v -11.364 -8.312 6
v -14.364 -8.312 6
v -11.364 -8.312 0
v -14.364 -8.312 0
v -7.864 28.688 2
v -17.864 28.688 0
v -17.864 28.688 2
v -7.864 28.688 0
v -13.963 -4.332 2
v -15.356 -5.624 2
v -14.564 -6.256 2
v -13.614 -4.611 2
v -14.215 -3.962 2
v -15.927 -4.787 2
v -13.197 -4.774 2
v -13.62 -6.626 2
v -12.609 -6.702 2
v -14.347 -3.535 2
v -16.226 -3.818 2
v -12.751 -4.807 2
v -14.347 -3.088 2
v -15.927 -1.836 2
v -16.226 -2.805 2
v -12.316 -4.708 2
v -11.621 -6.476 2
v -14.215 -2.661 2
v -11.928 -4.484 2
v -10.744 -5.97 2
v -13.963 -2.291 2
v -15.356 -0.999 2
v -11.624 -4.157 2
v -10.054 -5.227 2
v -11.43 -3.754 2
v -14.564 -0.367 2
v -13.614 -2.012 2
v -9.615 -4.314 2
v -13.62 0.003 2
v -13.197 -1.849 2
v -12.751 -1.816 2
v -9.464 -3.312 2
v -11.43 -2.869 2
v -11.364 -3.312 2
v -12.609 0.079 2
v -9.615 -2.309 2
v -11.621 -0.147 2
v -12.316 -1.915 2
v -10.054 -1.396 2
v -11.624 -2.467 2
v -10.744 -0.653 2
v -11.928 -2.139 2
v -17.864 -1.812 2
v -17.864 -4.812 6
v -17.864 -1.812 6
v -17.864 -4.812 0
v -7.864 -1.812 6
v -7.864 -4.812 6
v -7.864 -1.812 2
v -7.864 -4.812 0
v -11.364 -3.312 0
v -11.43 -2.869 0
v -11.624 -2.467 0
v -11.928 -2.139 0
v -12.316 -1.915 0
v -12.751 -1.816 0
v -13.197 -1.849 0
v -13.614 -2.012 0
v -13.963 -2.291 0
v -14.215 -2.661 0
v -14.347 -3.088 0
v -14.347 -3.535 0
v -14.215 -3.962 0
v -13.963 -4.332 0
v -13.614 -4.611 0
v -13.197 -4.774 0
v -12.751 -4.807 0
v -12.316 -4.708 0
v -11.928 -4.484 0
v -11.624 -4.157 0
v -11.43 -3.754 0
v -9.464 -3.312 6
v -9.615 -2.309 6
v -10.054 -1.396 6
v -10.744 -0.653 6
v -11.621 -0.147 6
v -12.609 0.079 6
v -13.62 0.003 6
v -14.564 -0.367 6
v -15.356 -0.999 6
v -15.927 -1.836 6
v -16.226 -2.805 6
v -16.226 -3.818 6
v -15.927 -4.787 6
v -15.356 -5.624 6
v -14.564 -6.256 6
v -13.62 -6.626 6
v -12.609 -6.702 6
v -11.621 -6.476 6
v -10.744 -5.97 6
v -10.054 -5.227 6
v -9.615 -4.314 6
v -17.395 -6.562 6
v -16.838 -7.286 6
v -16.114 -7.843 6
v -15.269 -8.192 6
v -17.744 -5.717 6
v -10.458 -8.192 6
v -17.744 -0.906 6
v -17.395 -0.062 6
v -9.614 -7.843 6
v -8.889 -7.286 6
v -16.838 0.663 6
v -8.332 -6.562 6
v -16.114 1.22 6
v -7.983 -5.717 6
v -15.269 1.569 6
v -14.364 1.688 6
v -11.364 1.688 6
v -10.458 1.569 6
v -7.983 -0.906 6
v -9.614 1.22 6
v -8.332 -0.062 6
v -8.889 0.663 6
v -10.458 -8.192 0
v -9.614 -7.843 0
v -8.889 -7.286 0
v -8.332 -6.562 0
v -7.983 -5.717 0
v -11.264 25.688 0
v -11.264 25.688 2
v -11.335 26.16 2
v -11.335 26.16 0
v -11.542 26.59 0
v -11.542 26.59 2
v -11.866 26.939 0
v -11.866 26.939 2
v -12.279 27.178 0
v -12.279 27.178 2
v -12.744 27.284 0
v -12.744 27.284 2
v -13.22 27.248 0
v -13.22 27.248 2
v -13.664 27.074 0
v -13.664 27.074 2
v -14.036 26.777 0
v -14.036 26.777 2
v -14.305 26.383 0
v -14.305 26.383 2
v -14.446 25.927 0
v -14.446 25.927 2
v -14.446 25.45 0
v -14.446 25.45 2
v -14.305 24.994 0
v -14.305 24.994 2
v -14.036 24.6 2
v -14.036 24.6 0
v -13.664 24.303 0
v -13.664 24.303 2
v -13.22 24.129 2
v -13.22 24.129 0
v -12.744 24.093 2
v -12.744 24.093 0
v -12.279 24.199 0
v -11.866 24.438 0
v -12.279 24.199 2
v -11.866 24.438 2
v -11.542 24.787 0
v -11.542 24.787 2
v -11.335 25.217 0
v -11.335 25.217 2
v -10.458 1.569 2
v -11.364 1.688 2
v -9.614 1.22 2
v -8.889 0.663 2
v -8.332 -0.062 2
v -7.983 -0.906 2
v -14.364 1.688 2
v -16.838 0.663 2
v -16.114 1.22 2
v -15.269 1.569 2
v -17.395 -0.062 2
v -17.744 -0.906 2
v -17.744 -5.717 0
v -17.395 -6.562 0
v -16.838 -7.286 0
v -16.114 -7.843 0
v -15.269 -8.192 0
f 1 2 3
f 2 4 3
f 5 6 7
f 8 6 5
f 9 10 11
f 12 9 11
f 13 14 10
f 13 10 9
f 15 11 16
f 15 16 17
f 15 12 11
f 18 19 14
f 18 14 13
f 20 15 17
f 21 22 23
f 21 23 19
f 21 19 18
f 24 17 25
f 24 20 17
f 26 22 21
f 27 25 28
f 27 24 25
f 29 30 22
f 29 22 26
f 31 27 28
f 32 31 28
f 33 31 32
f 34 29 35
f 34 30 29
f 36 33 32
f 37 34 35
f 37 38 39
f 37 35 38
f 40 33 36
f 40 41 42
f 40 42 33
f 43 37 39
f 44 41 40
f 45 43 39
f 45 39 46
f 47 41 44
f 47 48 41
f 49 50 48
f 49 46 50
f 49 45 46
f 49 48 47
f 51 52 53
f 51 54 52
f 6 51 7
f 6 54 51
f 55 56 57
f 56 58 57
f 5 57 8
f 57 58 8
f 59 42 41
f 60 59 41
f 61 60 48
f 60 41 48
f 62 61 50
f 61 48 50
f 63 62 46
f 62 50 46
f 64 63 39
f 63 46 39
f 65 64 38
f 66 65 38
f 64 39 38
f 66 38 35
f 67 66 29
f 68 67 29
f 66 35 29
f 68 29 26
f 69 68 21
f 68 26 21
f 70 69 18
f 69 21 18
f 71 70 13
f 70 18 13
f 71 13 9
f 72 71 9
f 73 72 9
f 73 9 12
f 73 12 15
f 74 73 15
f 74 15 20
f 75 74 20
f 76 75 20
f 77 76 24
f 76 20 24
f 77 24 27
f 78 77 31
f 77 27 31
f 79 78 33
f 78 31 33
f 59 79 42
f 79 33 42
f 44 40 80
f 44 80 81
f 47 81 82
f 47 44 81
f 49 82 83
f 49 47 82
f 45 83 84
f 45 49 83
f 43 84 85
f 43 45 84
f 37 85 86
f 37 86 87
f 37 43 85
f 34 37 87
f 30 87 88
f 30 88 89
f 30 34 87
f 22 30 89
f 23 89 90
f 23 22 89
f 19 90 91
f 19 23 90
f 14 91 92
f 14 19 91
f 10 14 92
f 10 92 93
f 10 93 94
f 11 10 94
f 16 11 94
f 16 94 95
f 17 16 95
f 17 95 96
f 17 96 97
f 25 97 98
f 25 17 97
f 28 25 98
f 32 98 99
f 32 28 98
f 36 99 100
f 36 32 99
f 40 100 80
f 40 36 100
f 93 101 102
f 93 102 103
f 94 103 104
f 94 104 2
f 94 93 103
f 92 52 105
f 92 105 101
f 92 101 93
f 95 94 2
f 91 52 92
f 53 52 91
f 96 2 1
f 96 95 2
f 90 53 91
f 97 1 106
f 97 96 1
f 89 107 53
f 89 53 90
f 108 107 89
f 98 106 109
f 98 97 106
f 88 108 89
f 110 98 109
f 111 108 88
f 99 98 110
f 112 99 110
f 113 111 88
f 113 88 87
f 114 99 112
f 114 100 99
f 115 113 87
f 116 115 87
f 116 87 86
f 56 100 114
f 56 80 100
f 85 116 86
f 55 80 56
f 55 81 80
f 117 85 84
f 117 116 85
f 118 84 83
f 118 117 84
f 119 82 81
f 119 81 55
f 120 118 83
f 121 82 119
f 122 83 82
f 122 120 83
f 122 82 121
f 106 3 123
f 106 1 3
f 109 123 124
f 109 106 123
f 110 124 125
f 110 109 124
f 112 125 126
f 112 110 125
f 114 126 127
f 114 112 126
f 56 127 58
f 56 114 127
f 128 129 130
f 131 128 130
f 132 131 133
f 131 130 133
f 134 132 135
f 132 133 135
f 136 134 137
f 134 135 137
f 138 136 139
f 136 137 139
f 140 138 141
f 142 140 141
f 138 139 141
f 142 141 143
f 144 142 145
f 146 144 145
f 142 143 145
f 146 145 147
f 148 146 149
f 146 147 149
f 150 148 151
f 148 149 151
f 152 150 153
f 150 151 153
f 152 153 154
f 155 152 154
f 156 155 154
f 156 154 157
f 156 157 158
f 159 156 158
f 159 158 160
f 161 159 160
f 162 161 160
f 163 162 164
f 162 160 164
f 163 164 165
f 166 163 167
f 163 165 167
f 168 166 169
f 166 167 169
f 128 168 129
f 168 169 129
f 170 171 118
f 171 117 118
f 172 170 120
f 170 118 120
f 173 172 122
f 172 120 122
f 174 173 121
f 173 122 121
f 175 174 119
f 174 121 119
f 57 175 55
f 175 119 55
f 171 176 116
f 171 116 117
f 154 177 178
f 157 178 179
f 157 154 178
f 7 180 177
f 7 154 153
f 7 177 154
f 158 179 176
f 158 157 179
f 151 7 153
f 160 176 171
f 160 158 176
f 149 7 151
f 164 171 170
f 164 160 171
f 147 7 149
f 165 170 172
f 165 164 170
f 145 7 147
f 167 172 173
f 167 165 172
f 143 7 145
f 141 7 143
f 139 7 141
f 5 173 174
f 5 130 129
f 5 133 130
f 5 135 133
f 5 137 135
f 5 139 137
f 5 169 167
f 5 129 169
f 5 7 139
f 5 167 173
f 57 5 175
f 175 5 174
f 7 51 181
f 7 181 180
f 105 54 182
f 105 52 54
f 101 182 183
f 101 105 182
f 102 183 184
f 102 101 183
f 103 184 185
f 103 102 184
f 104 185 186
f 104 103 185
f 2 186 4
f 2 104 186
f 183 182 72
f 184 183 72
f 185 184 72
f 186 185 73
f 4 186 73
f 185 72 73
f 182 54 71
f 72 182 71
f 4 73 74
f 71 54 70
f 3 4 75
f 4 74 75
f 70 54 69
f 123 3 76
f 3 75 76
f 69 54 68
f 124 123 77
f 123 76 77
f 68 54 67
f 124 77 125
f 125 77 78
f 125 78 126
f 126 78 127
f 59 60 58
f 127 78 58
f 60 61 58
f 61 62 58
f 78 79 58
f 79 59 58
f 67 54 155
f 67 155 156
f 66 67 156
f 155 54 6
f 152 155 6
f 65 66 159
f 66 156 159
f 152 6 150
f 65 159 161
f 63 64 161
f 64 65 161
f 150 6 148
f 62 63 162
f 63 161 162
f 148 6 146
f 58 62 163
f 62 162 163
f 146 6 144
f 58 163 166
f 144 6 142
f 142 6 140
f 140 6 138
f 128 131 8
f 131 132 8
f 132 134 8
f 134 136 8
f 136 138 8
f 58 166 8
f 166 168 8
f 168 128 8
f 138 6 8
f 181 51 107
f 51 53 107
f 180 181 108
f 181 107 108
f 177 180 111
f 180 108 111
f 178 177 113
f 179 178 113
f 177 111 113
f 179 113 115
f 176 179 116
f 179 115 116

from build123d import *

# Parameters (mm, degrees)
SKETCH1_W           = 10
SKETCH1_H           = 37
BOSS_EXTRUDE1_DEPTH = 2
SKETCH2_W           = 10
SKETCH2_H           = 10
SKETCH2_R           = 3.4
BOSS_EXTRUDE2_DEPTH = 4
SKETCH3_R           = 1.6
CUT_EXTRUDE1_DEPTH  = 2
FILLET1_R           = 3.5
SKETCH4_R           = 1.5
CUT_EXTRUDE2_DEPTH  = 2


with BuildPart() as part:
    # Sketch1 → Boss-Extrude1 (new body)
    with BuildSketch(Plane.XY):
        with Locations((-12.863567867, 10.18847884)):
            Rectangle(SKETCH1_W, SKETCH1_H)
    extrude(amount=BOSS_EXTRUDE1_DEPTH)

    # Sketch2 → Boss-Extrude2 (add)
    with BuildSketch(Plane.XY.offset(2)):
        with Locations((-12.863567867, -3.31152116)):
            Rectangle(SKETCH2_W, SKETCH2_H)
        with Locations((-12.863567867, -3.31152116)):
            Circle(SKETCH2_R, mode=Mode.SUBTRACT)
    extrude(amount=BOSS_EXTRUDE2_DEPTH)

    # Sketch3 → Cut-Extrude1 (cut)
    with BuildSketch(Plane.XY.offset(2)):
        with Locations((-12.863567867, 25.68847884)):
            Circle(SKETCH3_R)
    extrude(amount=-CUT_EXTRUDE1_DEPTH, mode=Mode.SUBTRACT)

    # Fillet1
    fillet1_edges = [part.edges().sort_by_distance(p)[0] for p in [
        (-7.863567867, -8.31152116, 3),
        (-17.863567867, -8.31152116, 3),
        (-17.863567867, 1.68847884, 4),
        (-7.863567867, 1.68847884, 4),
    ]]
    fillet(fillet1_edges, radius=FILLET1_R)

    # Sketch4 → Cut-Extrude2 (cut)
    with BuildSketch(Plane.XY.offset(2)):
        with Locations((-12.863567867, -3.31152116)):
            Circle(SKETCH4_R)
    extrude(amount=-CUT_EXTRUDE2_DEPTH, mode=Mode.SUBTRACT)


solid = part.part
